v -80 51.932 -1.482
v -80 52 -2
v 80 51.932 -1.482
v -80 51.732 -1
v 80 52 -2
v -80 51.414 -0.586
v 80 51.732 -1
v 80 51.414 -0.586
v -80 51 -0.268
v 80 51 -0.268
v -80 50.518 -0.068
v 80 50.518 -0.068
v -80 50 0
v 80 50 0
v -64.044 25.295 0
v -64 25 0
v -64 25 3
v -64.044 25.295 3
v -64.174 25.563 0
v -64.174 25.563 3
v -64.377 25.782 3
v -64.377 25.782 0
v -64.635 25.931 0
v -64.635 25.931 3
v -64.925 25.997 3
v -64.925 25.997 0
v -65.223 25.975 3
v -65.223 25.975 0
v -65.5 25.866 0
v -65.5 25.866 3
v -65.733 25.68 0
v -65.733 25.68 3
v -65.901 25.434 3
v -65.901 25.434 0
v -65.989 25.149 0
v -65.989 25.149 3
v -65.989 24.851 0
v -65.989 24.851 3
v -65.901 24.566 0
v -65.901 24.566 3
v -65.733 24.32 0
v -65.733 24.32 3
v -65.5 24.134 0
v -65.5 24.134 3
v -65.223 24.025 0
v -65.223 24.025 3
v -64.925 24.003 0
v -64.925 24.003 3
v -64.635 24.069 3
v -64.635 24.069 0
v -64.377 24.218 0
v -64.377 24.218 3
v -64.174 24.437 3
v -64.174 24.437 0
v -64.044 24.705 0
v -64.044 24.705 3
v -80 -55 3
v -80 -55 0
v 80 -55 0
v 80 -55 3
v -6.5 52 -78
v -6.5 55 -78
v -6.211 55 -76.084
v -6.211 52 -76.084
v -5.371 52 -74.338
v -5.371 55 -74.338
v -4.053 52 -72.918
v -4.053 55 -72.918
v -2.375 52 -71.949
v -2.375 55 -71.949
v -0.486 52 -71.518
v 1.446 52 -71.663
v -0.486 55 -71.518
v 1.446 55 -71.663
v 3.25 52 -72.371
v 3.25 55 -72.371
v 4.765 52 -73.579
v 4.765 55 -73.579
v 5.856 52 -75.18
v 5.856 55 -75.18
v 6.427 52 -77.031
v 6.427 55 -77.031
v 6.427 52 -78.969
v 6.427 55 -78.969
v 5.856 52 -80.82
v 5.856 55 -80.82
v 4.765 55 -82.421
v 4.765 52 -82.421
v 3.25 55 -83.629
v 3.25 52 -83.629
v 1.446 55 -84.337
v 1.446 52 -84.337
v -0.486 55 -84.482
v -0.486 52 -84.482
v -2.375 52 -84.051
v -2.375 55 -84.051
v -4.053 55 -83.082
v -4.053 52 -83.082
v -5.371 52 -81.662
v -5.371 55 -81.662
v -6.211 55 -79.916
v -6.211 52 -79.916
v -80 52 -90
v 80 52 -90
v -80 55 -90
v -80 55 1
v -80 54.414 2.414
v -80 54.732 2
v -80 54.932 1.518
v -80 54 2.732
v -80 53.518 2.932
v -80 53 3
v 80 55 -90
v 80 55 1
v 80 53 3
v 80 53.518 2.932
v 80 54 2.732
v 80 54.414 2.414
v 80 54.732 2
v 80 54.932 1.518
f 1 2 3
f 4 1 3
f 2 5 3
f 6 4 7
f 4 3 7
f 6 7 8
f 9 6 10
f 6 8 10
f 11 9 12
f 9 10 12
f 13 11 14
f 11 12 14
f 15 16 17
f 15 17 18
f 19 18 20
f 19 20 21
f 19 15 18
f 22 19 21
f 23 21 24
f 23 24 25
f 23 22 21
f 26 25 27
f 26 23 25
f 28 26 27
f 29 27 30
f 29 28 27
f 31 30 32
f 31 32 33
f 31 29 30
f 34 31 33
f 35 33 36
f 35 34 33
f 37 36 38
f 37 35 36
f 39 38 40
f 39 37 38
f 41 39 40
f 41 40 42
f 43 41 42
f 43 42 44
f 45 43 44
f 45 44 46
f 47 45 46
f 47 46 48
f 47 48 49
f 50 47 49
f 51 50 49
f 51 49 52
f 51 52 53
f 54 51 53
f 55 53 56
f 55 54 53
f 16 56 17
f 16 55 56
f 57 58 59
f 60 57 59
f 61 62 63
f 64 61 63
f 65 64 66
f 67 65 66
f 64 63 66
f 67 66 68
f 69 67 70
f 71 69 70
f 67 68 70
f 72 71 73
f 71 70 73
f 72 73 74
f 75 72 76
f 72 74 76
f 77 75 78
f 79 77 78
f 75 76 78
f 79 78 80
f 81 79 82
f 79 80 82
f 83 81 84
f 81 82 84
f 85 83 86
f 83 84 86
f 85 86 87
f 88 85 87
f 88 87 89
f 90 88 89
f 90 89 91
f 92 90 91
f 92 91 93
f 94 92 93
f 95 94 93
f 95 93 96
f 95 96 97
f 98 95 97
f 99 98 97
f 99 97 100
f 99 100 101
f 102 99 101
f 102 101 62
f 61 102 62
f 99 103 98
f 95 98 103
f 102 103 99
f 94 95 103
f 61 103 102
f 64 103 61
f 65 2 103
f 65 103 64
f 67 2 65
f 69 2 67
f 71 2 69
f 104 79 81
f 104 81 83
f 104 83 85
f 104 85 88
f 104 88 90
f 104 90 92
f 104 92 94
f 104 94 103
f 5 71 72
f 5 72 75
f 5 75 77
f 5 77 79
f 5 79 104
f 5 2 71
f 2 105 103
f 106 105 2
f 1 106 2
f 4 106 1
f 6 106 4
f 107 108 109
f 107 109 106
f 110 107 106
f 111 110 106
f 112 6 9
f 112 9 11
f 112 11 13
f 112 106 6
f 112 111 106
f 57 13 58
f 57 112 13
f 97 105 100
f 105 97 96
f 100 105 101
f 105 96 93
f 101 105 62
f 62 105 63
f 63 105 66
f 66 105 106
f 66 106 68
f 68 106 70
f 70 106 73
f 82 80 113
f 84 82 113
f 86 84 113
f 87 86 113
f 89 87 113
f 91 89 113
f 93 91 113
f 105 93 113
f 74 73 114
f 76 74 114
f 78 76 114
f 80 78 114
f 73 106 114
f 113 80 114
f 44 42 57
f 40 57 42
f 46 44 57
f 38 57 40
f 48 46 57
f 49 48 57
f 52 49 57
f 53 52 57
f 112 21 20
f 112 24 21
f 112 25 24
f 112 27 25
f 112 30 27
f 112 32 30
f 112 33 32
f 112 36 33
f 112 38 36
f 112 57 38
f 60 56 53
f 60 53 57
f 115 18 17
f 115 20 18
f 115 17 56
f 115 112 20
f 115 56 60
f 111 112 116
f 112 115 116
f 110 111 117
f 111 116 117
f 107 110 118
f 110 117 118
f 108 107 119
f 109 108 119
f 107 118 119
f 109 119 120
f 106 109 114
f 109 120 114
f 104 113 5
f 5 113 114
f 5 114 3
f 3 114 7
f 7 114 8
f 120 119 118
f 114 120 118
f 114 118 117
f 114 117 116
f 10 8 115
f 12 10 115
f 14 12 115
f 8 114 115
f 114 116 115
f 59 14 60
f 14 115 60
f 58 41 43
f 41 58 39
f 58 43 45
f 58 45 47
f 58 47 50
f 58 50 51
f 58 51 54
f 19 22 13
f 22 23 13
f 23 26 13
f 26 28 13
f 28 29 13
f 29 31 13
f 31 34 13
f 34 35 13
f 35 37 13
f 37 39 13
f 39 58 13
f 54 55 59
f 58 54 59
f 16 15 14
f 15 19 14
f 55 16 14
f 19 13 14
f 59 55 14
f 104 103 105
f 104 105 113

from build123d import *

# Parameters (mm, degrees)
F0_W     = 160
F0_H     = 110
F0_R     = 1
F1_DEPTH = 3
F2_W     = 160
F2_H     = 3
F3_DEPTH = 90
F4_R     = 6.5
F5_DEPTH = 110.001
F6_R     = 2


with BuildPart() as f1:
    # F0 (on Top) → F1 (new body)
    with BuildSketch(Plane.XY):
        Rectangle(F0_W, F0_H)
        with Locations((-65, 25)):
            Circle(F0_R, mode=Mode.SUBTRACT)
    extrude(amount=F1_DEPTH)

    # F2 (on face) → F3 (join)
    with BuildSketch(Plane(origin=(0, 0, 0), x_dir=(1, 0, 0), z_dir=(0, 0, -1))):
        with Locations((0, -53.5)):
            Rectangle(F2_W, F2_H)
    extrude(amount=F3_DEPTH)

    # F4 (on face) → F5 (cut, through all)
    with BuildSketch(Plane(origin=(0, 55, 0), x_dir=(-1, 0, 0), z_dir=(0, 1, 0))):
        with Locations((0, -78)):
            Circle(F4_R)
    extrude(amount=-F5_DEPTH, mode=Mode.SUBTRACT)

    # F6
    f6_edges = [f1.edges().sort_by_distance(p)[0] for p in [
        (0, 55, 3),
        (0, 52, 0),
    ]]
    fillet(f6_edges, radius=F6_R)


solid = f1.part
